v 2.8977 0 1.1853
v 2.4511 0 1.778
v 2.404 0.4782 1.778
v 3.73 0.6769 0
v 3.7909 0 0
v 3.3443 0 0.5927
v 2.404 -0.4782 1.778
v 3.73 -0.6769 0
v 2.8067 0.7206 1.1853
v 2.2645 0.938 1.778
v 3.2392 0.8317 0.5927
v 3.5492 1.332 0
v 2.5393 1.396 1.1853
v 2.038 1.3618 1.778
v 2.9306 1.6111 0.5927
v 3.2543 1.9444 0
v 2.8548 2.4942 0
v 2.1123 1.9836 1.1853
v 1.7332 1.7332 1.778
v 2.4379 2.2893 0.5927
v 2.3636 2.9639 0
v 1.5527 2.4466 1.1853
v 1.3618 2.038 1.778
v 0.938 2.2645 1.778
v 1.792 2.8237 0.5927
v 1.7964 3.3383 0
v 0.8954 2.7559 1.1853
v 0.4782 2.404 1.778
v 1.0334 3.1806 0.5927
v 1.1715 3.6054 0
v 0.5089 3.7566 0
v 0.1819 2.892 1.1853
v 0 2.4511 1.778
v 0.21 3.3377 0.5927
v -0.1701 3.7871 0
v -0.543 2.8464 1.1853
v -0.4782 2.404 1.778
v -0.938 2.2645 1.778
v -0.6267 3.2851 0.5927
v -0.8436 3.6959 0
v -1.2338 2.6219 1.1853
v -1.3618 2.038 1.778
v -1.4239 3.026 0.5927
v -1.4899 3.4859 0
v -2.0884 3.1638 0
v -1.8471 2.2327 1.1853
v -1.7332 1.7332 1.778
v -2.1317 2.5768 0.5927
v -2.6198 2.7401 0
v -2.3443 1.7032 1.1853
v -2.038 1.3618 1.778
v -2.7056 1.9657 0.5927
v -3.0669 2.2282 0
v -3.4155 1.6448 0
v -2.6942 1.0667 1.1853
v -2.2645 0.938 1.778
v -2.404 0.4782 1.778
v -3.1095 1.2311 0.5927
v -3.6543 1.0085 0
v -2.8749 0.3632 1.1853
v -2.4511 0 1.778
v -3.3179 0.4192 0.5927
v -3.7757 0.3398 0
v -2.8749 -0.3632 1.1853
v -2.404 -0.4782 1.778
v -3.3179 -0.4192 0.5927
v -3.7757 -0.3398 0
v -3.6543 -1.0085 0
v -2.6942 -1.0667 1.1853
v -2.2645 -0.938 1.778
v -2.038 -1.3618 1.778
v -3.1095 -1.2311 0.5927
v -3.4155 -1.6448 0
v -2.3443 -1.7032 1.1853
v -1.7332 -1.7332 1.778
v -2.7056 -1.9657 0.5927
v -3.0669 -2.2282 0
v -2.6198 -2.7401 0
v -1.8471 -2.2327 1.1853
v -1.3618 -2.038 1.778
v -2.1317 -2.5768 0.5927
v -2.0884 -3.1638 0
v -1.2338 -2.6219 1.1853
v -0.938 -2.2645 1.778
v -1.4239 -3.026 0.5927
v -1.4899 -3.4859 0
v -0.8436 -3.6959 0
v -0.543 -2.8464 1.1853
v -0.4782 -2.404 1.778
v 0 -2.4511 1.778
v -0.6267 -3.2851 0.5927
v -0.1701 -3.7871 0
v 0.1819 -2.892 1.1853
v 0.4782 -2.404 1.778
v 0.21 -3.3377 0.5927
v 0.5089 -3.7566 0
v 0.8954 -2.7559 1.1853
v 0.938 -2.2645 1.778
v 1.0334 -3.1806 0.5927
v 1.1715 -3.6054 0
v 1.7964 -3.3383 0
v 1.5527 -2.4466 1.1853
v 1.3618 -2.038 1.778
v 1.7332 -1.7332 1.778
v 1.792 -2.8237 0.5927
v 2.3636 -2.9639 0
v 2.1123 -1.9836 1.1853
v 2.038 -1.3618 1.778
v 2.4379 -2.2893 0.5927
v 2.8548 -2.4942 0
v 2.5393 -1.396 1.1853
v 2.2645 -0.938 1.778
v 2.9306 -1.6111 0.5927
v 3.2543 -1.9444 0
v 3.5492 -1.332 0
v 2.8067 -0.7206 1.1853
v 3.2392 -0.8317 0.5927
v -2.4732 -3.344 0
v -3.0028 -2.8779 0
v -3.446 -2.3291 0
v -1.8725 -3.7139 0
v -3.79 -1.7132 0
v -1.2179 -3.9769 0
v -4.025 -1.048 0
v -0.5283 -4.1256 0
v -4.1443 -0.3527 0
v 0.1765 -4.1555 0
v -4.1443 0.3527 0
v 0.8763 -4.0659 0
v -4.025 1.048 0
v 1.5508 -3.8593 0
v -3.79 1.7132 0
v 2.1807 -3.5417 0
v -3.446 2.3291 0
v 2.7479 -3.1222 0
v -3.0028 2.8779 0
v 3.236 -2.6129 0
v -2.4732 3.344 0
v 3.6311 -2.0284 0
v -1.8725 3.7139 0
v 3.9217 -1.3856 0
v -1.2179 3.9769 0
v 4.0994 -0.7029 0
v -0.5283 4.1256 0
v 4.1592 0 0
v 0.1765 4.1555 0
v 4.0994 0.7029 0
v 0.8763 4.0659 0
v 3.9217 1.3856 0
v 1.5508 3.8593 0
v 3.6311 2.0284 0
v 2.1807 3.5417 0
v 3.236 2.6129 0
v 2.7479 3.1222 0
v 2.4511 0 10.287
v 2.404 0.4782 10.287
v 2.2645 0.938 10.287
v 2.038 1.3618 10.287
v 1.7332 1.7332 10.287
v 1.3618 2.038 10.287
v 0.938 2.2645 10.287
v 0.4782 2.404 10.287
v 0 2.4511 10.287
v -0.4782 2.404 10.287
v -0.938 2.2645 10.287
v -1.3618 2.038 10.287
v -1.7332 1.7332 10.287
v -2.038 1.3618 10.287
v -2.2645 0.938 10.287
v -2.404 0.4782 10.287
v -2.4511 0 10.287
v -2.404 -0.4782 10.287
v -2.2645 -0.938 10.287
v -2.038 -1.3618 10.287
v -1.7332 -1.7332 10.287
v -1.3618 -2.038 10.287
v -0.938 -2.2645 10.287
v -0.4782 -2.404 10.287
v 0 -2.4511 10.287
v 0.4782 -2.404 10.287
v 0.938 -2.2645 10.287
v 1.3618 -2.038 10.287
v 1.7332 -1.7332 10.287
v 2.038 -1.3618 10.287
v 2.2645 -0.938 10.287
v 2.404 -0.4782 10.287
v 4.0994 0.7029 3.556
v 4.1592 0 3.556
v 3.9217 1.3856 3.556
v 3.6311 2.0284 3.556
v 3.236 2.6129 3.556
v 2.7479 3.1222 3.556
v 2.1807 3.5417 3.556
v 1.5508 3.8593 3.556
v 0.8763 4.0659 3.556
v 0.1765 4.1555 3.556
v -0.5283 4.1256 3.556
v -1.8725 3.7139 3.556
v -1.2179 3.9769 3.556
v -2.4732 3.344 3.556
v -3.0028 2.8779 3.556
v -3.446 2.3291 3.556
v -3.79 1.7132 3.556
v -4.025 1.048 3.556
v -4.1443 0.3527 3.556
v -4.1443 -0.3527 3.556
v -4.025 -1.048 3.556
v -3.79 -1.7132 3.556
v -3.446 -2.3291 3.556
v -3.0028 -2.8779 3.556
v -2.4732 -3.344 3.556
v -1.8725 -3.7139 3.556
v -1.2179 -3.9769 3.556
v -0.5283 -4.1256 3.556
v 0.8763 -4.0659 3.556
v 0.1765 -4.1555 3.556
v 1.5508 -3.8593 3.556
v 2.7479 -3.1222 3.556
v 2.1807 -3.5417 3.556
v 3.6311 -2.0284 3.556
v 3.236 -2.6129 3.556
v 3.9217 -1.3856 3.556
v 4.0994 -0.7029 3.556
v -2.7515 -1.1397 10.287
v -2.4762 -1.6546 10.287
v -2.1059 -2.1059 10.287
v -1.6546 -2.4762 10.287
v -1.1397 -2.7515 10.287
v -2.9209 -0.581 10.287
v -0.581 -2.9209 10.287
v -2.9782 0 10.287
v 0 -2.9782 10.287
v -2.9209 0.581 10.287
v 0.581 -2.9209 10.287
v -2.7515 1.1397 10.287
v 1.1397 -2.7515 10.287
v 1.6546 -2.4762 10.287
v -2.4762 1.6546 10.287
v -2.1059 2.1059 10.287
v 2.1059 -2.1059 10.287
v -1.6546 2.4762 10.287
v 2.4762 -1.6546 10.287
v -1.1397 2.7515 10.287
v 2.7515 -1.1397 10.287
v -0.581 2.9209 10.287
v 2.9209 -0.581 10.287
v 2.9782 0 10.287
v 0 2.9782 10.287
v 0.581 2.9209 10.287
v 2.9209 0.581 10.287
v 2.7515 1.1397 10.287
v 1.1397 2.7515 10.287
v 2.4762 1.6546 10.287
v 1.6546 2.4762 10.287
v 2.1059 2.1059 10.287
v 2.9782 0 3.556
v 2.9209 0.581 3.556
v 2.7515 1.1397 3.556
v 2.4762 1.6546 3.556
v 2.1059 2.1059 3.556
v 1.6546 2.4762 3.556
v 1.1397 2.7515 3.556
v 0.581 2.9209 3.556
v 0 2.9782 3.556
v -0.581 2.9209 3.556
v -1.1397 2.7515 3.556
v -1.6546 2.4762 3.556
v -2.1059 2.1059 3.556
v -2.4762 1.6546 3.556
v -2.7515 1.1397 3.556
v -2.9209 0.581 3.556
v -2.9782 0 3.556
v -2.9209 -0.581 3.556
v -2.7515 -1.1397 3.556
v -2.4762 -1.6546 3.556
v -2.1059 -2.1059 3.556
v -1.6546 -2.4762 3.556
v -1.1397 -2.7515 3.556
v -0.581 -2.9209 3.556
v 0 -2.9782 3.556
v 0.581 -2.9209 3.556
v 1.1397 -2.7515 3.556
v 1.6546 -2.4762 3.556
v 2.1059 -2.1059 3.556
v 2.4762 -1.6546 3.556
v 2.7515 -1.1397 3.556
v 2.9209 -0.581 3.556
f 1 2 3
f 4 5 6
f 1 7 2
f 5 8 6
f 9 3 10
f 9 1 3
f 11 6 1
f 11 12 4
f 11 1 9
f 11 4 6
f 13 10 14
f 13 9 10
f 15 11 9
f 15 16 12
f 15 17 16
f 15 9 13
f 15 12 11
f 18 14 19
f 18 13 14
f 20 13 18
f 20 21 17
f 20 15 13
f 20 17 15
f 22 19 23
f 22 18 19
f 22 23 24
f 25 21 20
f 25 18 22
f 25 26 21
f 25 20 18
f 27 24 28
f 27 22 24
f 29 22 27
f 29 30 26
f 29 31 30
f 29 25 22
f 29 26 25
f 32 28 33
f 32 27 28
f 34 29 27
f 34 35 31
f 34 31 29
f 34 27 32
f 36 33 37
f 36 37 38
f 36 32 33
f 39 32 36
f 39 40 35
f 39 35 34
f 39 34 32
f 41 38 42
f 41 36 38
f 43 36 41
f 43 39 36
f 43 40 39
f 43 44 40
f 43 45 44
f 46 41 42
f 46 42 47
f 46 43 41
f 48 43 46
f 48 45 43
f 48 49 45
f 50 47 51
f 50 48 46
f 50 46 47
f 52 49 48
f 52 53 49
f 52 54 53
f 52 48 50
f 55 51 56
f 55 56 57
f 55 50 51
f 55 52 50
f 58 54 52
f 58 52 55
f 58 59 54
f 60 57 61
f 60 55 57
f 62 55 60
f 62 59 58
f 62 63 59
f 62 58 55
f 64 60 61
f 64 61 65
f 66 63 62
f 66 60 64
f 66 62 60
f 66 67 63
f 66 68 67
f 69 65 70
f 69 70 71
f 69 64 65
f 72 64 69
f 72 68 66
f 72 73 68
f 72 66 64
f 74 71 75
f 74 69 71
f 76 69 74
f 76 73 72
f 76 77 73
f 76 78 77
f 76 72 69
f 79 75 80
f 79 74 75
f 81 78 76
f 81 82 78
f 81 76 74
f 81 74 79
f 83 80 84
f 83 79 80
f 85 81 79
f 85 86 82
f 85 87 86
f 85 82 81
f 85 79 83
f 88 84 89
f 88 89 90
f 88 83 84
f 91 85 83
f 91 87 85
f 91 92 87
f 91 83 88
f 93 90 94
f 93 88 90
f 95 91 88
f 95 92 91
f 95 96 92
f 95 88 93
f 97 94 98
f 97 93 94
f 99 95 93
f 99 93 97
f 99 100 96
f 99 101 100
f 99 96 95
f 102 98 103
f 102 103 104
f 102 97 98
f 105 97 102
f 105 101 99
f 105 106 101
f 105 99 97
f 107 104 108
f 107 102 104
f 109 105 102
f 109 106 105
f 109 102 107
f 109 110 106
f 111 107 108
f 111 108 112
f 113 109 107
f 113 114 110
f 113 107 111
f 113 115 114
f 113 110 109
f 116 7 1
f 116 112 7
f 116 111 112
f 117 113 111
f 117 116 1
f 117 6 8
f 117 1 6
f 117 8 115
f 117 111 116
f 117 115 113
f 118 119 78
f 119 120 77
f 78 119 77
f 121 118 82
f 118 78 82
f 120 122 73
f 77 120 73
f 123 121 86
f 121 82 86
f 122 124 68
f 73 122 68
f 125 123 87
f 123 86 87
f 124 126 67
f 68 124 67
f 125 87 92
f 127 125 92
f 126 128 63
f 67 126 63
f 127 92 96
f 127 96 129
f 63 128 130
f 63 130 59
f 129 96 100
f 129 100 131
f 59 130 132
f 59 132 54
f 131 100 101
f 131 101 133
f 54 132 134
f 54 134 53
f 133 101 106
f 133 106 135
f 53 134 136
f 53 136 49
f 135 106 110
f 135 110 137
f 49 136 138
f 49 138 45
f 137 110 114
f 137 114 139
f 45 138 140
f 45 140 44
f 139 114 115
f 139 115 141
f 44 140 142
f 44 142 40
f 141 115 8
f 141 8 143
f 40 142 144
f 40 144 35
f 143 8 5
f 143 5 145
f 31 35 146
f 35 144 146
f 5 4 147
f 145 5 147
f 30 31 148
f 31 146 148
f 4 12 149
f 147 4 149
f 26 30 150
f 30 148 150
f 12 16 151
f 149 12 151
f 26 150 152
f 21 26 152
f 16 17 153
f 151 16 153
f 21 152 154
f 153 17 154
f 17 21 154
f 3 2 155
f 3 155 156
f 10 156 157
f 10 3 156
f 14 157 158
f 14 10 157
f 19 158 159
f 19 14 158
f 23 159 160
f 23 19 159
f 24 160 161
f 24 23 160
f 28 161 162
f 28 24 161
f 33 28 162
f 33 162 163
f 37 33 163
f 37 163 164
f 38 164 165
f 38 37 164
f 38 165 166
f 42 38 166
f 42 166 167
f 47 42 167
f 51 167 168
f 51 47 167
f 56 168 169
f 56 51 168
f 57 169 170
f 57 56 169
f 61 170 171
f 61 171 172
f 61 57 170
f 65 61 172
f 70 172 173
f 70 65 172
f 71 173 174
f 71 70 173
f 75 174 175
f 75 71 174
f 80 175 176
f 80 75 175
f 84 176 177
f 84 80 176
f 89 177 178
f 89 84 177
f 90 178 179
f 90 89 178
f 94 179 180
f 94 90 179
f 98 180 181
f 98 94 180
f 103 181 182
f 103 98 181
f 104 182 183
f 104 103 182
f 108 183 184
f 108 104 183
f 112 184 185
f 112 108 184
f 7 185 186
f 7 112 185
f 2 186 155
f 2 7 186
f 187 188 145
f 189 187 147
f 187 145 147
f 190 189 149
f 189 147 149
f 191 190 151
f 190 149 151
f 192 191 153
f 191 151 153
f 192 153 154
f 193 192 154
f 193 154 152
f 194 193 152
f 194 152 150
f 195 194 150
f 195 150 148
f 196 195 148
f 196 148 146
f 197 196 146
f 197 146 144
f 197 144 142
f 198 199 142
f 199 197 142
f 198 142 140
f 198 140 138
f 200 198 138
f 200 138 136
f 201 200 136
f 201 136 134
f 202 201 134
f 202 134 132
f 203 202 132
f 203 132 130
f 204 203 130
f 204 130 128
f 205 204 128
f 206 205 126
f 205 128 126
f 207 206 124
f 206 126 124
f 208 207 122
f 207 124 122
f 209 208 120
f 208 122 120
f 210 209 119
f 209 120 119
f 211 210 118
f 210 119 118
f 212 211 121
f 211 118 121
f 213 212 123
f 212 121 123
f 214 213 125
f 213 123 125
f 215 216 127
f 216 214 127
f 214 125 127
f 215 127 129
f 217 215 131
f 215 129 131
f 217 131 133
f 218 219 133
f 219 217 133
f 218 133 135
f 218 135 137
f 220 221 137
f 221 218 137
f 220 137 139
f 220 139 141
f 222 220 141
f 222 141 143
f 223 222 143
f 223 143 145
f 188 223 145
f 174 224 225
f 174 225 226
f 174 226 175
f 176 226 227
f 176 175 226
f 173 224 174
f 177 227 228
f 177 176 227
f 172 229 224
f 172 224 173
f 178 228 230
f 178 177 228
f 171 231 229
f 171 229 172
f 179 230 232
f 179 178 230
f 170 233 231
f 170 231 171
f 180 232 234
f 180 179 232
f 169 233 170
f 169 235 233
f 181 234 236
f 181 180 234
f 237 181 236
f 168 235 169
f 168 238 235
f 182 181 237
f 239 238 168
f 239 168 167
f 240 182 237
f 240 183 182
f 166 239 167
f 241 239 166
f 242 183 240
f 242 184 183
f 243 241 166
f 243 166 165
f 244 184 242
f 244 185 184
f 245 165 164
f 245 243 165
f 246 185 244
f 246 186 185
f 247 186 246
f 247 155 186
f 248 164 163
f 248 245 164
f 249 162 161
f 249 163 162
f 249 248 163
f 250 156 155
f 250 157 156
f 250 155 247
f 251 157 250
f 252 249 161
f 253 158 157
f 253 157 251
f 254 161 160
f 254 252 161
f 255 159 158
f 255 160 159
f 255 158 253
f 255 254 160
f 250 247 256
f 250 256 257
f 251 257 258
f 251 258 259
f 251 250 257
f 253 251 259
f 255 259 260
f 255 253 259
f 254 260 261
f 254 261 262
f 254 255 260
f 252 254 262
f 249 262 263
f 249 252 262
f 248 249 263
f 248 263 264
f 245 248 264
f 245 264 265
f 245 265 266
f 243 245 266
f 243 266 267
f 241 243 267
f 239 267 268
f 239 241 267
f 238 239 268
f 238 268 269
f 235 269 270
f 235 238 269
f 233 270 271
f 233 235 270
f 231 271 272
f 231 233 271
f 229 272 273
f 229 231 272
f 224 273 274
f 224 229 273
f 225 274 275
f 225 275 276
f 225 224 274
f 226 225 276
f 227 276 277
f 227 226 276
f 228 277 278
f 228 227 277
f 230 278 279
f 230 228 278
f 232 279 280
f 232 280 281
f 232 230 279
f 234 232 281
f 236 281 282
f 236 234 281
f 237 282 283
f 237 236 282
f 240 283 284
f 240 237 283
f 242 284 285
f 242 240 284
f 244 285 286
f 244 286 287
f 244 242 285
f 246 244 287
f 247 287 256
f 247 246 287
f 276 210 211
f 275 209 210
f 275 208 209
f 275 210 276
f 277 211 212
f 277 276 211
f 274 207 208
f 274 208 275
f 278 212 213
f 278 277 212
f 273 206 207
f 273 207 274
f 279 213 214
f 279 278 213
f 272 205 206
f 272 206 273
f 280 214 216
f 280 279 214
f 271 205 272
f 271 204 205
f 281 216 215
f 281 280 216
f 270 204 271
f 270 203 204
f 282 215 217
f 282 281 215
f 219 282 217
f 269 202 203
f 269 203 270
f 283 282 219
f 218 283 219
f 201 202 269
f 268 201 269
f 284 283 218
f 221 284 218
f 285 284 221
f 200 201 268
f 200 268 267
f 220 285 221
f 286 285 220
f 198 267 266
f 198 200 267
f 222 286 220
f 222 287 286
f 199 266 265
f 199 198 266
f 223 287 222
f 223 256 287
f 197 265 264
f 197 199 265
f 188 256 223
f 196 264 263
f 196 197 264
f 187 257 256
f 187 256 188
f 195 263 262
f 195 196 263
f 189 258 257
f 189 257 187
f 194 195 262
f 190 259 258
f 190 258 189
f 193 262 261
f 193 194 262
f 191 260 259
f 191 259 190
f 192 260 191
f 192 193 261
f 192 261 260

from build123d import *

# Parameters (mm, degrees)
SKETCH1_R           = 4.15925
SKETCH1_R_2         = 2.4511
BOSS_EXTRUDE1_DEPTH = 10.287
SKETCH2_OUTSIDE_W   = 13.444
SKETCH2_OUTSIDE_H   = 13.444
SKETCH2_OUTSIDE_R   = 2.97815
CUT_EXTRUDE1_DEPTH  = 6.731
CHAMFER1_SIZE       = 1.778
CHAMFER1_SIZE2      = 1.339819101


with BuildPart() as part:
    # Sketch1 → Boss-Extrude1 (new body)
    with BuildSketch(Plane.XY):
        Circle(SKETCH1_R)
        Circle(SKETCH1_R_2, mode=Mode.SUBTRACT)
    extrude(amount=BOSS_EXTRUDE1_DEPTH)

    # Sketch2 outside → Cut-Extrude1 (cut)
    with BuildSketch(Plane.XY.offset(10.287)):
        Rectangle(SKETCH2_OUTSIDE_W, SKETCH2_OUTSIDE_H)
        Circle(SKETCH2_OUTSIDE_R, mode=Mode.SUBTRACT)
    extrude(amount=-CUT_EXTRUDE1_DEPTH, mode=Mode.SUBTRACT)

    # Chamfer1
    chamfer1_edges = [part.edges().sort_by_distance(p)[0] for p in [
        (-2.4511, 0, 0),
    ]]
    chamfer1_side = [part.faces().sort_by_distance(p)[0] for p in [
        (-2.4511, 0, 5.1435),
    ]]
    chamfer(chamfer1_edges, length=CHAMFER1_SIZE, length2=CHAMFER1_SIZE2, reference=chamfer1_side[0])


solid = part.part
